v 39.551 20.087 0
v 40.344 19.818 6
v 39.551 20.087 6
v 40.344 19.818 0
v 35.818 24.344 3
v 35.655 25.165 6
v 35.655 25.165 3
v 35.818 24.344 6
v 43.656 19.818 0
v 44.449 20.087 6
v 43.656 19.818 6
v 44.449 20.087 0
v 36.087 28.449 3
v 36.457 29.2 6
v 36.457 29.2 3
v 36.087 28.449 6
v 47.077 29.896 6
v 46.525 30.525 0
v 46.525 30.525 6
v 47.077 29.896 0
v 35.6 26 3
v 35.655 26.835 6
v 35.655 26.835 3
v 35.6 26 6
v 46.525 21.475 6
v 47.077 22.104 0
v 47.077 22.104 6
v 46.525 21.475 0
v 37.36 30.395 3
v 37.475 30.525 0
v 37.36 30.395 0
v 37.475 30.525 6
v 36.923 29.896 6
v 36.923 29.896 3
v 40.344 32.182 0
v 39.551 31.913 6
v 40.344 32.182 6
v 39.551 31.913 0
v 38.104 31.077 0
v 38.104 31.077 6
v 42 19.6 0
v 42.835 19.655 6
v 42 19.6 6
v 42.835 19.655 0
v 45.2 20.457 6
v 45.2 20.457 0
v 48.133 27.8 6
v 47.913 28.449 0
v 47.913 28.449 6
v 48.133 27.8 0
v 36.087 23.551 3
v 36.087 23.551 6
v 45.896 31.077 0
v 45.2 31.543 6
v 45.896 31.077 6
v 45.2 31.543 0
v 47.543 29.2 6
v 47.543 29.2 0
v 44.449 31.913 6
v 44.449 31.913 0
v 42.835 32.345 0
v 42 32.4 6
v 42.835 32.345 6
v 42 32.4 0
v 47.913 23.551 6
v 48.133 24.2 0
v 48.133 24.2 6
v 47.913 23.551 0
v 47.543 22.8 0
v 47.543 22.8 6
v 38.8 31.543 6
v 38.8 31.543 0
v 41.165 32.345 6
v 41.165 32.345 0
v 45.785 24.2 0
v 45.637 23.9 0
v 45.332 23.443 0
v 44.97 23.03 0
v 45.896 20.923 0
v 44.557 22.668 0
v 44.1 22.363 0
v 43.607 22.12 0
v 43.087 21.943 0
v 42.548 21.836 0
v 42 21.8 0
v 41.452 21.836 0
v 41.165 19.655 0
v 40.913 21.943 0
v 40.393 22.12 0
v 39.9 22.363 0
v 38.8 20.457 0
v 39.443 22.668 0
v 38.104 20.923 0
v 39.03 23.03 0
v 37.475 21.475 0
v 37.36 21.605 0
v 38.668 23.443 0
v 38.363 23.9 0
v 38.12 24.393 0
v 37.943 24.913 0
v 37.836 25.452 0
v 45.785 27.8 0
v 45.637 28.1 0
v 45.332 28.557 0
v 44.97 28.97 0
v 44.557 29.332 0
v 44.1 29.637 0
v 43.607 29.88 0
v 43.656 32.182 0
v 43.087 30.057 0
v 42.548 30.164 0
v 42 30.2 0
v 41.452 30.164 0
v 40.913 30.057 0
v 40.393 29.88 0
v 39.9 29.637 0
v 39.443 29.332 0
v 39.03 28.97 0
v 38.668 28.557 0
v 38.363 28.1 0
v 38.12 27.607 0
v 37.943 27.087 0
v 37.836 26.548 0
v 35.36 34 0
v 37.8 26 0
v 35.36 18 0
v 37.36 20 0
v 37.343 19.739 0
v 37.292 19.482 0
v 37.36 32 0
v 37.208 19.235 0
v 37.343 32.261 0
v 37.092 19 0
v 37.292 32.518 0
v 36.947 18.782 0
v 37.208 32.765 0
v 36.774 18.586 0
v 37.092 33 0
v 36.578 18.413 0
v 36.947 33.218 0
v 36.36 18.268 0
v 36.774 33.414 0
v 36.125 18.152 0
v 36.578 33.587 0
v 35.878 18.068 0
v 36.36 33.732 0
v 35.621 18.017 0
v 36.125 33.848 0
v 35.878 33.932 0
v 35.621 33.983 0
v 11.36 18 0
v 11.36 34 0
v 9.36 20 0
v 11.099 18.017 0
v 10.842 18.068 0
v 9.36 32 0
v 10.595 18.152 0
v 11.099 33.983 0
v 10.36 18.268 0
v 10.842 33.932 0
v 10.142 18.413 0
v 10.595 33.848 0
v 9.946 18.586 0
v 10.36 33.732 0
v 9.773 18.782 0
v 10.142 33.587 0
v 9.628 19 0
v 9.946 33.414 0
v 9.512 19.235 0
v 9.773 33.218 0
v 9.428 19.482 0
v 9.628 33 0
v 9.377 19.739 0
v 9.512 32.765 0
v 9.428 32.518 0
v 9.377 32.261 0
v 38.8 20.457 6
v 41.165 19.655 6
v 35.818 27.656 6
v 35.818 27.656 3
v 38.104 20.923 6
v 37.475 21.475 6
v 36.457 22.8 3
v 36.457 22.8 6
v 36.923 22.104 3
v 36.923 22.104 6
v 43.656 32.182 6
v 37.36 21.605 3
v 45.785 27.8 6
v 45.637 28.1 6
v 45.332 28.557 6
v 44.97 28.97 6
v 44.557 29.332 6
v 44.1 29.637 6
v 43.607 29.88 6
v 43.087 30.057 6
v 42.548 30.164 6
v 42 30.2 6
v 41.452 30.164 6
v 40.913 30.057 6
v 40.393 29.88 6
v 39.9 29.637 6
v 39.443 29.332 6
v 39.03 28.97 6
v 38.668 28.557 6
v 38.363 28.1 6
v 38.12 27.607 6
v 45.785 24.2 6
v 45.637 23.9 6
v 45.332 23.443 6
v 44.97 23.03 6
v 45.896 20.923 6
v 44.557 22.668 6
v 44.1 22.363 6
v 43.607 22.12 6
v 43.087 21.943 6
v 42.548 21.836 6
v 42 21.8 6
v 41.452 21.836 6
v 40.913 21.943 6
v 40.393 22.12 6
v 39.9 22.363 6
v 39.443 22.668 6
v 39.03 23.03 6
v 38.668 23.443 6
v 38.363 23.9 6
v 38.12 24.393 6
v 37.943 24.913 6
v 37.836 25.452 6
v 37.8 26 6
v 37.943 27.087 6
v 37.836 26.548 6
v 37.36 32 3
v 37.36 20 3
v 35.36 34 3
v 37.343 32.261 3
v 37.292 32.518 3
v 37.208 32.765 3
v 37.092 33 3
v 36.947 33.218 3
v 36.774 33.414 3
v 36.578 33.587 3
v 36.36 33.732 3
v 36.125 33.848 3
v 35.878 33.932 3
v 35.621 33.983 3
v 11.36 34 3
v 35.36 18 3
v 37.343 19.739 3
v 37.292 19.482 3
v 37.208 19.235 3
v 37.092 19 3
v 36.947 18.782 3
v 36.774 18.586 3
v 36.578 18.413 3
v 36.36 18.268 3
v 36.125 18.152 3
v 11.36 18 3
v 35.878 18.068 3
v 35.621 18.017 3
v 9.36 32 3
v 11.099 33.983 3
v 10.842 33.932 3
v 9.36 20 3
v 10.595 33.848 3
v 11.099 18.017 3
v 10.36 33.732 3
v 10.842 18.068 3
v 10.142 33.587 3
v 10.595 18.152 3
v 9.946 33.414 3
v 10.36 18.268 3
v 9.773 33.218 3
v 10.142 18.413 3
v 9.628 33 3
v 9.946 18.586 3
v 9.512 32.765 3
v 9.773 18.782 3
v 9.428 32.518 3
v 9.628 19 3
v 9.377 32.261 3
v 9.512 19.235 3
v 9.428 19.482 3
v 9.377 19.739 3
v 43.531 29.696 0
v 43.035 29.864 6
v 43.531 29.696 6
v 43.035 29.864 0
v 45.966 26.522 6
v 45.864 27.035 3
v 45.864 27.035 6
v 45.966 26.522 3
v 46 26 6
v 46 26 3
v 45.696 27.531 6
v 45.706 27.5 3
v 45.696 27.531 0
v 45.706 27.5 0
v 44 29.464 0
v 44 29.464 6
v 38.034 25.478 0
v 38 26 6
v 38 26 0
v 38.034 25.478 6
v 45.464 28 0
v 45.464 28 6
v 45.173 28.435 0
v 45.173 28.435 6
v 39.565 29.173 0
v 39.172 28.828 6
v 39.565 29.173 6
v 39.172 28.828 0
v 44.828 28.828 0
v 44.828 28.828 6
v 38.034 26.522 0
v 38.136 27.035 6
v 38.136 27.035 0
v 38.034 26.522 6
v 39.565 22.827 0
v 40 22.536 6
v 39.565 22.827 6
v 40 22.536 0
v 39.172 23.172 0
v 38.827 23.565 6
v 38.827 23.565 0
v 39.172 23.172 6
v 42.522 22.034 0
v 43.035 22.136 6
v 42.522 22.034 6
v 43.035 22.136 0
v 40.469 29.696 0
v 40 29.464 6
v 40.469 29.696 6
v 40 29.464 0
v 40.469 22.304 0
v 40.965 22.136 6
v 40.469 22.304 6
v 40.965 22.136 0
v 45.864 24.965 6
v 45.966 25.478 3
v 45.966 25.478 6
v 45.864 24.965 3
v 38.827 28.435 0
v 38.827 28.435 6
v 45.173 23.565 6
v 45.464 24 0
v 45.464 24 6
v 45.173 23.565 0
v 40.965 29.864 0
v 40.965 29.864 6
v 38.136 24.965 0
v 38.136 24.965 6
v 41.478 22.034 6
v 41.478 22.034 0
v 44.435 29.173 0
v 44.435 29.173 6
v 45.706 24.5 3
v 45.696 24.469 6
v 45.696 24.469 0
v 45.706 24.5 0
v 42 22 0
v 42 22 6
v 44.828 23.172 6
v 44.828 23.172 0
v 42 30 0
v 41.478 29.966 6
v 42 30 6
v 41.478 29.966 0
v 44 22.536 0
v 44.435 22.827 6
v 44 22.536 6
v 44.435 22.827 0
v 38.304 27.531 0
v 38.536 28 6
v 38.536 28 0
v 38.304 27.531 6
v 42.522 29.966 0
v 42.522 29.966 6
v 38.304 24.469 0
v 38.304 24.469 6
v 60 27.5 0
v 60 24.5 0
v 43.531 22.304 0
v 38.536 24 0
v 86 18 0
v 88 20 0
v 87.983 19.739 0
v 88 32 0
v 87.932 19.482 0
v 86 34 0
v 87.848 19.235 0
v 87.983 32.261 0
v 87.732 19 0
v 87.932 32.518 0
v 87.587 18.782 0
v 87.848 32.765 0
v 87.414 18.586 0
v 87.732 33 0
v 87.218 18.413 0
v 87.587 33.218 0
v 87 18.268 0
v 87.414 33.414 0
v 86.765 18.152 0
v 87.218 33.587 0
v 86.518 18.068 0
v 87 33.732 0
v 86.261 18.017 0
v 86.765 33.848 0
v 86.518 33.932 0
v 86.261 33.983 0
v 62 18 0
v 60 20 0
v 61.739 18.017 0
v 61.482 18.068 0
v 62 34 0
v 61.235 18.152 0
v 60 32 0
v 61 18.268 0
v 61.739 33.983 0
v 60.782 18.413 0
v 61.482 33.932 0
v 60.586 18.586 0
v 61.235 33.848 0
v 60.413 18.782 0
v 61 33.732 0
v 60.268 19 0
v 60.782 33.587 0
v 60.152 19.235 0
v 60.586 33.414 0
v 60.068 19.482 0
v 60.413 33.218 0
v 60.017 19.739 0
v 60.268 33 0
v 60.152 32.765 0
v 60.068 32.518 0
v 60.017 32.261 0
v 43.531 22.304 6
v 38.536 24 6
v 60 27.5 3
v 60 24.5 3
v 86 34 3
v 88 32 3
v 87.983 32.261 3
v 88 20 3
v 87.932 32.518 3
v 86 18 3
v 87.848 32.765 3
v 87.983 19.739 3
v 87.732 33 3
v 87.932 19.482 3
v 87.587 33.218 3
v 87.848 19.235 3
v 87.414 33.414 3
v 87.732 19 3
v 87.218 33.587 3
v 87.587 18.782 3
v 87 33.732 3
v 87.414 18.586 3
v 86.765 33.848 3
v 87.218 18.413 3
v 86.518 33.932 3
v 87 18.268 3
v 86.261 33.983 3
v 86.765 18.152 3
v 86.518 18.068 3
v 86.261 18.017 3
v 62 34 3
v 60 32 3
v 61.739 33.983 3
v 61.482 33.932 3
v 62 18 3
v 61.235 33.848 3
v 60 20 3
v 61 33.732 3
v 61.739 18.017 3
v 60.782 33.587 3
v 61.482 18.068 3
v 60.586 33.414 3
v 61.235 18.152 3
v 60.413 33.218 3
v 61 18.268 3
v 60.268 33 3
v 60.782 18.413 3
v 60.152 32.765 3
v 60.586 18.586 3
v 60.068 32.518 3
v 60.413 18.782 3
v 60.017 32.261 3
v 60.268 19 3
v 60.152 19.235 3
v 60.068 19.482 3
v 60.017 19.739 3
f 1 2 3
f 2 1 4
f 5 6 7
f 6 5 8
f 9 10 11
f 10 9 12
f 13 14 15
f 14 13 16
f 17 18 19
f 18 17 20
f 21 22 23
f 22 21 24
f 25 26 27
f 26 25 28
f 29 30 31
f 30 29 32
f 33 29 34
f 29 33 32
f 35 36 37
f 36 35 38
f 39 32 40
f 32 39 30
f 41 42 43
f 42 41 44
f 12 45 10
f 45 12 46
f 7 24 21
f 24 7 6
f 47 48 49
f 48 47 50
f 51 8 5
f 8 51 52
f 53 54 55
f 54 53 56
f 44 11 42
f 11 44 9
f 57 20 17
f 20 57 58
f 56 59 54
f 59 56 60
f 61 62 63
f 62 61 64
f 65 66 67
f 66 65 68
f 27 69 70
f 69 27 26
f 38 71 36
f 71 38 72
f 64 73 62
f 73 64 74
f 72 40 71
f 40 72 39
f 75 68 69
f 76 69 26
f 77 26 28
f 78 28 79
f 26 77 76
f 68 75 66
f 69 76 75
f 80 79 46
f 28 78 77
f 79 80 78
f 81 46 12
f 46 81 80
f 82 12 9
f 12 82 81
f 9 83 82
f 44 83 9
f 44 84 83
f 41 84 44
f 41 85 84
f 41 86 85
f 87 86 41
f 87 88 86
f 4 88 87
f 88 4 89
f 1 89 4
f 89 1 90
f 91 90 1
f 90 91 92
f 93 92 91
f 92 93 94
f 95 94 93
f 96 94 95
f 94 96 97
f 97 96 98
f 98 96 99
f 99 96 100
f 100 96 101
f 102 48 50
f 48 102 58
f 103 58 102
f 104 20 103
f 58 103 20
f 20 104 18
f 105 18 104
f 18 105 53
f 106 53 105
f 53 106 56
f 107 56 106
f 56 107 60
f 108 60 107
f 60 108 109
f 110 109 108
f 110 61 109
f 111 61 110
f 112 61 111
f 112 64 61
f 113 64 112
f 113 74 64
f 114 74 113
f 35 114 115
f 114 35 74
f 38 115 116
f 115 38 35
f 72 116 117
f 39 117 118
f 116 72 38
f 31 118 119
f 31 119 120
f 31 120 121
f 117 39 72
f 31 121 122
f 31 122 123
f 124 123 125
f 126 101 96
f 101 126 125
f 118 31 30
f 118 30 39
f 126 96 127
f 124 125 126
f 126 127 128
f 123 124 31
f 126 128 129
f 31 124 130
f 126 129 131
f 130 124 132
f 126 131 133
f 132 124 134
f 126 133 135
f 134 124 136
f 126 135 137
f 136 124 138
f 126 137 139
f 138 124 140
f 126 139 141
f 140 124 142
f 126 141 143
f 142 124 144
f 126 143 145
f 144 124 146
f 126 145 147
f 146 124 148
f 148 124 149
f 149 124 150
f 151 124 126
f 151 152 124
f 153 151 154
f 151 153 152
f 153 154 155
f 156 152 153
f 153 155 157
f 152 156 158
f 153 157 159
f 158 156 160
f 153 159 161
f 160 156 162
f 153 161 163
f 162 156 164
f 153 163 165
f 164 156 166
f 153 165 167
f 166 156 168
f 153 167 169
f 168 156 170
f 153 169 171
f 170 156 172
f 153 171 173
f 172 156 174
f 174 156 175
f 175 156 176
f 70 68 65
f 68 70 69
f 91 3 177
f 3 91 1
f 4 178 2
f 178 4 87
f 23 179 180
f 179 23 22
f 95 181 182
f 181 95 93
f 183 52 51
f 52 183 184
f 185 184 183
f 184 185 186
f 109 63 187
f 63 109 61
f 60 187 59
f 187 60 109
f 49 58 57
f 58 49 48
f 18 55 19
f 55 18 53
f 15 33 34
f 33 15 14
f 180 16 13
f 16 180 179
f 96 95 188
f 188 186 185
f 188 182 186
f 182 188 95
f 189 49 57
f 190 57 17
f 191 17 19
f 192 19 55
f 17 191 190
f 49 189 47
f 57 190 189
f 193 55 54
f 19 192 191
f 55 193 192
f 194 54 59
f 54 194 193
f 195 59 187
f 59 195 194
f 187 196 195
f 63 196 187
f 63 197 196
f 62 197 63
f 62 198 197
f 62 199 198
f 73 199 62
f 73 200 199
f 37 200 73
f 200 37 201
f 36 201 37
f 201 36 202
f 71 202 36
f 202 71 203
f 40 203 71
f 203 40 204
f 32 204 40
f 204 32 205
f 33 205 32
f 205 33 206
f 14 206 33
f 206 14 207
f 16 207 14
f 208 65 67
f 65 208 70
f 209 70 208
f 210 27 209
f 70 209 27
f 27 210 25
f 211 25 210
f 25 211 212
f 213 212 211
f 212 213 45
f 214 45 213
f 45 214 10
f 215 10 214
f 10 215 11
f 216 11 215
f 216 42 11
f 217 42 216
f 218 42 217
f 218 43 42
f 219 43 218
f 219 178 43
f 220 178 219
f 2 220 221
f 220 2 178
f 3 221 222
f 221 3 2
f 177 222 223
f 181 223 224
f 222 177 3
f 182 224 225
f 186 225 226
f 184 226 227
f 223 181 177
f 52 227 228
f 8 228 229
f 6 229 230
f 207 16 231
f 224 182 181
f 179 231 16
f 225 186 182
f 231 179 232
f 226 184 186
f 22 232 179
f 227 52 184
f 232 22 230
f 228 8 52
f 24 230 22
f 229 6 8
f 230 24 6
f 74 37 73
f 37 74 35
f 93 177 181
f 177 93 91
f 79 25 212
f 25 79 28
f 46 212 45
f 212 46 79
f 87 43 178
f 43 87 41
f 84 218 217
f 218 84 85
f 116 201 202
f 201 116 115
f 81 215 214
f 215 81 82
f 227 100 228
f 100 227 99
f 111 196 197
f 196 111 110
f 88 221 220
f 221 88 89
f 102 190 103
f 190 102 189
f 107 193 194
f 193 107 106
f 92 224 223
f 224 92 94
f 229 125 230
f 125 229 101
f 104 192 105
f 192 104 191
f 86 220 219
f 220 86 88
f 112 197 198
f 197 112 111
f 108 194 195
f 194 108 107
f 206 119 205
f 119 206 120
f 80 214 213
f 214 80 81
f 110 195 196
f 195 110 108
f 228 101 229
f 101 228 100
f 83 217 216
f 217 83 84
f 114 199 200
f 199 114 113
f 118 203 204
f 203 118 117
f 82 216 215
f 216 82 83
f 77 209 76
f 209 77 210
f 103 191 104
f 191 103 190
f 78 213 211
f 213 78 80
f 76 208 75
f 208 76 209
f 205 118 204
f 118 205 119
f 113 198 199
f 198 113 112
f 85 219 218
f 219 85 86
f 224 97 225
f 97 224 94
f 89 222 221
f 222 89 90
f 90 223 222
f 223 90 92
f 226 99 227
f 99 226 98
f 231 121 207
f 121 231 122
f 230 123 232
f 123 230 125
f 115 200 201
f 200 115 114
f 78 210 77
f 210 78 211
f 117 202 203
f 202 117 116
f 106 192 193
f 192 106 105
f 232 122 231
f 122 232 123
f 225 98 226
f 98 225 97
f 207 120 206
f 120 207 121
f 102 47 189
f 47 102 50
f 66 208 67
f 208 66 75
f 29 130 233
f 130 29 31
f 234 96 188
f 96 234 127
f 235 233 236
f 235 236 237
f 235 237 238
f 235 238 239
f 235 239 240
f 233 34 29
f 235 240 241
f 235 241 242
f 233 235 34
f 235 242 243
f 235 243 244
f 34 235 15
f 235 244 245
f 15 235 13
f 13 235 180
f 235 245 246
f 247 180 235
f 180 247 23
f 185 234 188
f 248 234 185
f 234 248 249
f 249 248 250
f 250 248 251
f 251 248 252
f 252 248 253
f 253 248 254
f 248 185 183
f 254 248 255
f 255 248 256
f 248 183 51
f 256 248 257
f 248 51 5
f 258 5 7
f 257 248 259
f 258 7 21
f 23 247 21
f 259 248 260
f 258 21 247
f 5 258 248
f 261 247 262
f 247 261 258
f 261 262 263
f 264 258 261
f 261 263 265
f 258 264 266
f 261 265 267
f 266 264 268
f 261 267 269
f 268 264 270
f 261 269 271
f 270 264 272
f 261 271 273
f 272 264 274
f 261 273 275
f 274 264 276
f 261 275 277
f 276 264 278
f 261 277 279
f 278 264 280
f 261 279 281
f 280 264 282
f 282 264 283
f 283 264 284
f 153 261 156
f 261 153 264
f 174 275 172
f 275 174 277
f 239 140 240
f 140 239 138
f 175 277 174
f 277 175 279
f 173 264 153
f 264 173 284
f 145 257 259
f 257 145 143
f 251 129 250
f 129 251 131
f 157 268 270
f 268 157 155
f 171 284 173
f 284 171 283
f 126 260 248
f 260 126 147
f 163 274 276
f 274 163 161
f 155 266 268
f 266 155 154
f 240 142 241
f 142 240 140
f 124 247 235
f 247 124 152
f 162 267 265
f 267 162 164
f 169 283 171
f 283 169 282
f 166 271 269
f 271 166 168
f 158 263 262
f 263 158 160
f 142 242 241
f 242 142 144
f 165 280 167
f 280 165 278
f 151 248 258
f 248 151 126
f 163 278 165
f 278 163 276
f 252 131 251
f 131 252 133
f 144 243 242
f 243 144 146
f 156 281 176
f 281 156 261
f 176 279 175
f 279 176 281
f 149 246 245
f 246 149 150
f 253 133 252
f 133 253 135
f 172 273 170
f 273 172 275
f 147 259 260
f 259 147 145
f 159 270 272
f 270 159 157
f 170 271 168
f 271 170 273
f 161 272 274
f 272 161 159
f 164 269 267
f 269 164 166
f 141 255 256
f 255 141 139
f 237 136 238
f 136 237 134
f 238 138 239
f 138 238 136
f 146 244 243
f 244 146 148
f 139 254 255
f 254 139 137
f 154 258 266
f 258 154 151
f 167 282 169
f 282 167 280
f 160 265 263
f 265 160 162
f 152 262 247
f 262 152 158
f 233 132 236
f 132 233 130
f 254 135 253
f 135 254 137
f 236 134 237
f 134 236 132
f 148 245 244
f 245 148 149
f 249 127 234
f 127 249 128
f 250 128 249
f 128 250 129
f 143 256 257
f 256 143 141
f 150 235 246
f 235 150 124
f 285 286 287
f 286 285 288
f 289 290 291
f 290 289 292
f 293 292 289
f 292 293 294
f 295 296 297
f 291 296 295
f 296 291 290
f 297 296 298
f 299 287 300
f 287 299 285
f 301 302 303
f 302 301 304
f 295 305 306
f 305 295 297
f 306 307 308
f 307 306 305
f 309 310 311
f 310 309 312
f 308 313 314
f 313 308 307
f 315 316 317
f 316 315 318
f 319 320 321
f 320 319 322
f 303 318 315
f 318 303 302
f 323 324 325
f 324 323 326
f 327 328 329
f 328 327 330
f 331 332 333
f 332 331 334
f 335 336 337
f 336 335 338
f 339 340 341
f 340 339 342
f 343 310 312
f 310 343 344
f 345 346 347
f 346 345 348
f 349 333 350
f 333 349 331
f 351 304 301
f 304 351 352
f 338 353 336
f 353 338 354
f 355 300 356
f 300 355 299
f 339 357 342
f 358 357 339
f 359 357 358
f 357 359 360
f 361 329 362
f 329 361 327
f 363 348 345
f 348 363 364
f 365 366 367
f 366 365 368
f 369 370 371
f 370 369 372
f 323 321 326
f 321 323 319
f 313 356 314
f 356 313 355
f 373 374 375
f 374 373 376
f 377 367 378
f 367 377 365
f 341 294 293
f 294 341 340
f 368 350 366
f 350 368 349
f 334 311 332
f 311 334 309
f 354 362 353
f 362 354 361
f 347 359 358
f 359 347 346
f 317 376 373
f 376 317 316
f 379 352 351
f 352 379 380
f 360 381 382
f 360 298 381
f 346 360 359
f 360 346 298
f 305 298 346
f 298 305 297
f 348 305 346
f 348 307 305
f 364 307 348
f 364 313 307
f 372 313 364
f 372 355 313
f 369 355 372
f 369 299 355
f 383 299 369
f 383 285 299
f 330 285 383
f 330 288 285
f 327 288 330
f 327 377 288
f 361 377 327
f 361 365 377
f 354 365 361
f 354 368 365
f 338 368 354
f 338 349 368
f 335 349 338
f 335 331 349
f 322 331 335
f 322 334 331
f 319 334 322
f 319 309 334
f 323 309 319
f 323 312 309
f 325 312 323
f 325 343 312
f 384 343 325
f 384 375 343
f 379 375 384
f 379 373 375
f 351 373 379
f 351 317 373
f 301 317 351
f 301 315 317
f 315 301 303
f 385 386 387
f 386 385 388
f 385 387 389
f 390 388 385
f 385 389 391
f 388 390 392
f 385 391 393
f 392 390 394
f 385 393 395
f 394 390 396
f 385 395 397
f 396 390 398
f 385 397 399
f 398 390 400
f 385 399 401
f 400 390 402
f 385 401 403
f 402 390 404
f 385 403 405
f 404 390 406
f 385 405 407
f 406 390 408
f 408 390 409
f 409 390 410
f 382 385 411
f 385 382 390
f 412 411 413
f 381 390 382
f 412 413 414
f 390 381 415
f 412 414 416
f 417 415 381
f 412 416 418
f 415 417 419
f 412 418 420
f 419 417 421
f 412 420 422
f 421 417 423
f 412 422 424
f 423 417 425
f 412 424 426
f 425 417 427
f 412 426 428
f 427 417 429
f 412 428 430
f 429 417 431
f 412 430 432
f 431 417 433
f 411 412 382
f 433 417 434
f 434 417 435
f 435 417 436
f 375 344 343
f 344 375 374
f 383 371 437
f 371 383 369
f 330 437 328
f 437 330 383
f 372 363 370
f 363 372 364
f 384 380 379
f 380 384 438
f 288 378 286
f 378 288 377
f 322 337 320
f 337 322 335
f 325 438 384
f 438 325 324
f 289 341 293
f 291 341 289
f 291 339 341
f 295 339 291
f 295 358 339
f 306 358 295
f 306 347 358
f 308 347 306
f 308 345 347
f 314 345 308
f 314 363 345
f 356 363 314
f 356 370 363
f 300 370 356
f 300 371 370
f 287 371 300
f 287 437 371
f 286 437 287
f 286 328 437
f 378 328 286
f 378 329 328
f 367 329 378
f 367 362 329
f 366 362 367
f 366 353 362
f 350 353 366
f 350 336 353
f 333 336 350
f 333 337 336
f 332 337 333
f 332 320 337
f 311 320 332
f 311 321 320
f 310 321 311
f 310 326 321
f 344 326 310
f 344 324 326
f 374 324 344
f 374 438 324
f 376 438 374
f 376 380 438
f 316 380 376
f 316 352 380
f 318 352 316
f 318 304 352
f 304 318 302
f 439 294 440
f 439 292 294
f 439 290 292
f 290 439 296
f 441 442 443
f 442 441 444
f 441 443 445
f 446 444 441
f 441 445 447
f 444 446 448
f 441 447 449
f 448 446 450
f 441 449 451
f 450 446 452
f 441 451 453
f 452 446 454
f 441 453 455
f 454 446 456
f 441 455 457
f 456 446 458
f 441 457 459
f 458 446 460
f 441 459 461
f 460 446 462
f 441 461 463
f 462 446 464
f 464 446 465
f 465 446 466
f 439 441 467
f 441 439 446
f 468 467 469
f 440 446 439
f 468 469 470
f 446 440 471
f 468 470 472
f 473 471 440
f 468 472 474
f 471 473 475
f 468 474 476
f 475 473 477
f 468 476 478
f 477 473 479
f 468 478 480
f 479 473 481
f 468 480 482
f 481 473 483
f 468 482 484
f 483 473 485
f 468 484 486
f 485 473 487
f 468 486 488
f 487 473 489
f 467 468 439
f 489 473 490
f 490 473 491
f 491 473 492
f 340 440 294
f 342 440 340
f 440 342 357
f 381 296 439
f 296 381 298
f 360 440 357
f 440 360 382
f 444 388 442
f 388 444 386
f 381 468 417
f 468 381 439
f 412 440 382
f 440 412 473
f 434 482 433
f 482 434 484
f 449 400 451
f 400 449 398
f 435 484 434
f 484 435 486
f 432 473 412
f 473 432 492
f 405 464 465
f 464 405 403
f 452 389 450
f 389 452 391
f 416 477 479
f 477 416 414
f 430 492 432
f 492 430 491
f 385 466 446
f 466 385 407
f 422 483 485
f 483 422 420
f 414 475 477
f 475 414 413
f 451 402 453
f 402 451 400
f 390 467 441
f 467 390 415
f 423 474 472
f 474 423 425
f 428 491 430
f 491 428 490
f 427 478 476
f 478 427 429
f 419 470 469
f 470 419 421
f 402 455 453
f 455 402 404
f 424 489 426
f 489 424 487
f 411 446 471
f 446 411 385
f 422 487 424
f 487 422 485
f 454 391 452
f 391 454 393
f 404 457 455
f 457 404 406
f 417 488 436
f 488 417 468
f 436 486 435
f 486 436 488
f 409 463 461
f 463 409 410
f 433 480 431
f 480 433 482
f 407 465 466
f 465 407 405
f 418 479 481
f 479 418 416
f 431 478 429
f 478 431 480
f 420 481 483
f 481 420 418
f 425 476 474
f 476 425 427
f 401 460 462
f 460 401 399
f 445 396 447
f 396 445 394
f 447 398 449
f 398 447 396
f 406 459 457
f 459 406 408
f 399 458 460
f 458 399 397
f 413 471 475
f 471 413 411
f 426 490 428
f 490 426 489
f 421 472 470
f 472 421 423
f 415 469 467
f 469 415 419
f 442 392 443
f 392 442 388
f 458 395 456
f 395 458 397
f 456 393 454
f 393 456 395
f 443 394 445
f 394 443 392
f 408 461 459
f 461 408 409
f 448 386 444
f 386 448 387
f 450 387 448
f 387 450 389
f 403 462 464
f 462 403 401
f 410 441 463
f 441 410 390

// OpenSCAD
/*
Sample 005: Print-in-Place-Flachdrehgelenk — 0,20 mm
Generated from the FDM Mechanical Sample Library.
Units: millimetres.

Override examples:
  openscad -o custom.stl -D 'view="plate"' -D 'render_fn=64' model.scad
  openscad -o preview.png -D 'view="assembly"' model.scad
*/
use <../../../library/fdm_mechanisms.scad>

render_fn = is_undef(render_fn) ? 48 : render_fn;
view = is_undef(view) ? "plate" : view;
$fn = render_fn;

sample_pip_pivot(
    view=view,
    clearance=0.2,
    core_d=8
);
